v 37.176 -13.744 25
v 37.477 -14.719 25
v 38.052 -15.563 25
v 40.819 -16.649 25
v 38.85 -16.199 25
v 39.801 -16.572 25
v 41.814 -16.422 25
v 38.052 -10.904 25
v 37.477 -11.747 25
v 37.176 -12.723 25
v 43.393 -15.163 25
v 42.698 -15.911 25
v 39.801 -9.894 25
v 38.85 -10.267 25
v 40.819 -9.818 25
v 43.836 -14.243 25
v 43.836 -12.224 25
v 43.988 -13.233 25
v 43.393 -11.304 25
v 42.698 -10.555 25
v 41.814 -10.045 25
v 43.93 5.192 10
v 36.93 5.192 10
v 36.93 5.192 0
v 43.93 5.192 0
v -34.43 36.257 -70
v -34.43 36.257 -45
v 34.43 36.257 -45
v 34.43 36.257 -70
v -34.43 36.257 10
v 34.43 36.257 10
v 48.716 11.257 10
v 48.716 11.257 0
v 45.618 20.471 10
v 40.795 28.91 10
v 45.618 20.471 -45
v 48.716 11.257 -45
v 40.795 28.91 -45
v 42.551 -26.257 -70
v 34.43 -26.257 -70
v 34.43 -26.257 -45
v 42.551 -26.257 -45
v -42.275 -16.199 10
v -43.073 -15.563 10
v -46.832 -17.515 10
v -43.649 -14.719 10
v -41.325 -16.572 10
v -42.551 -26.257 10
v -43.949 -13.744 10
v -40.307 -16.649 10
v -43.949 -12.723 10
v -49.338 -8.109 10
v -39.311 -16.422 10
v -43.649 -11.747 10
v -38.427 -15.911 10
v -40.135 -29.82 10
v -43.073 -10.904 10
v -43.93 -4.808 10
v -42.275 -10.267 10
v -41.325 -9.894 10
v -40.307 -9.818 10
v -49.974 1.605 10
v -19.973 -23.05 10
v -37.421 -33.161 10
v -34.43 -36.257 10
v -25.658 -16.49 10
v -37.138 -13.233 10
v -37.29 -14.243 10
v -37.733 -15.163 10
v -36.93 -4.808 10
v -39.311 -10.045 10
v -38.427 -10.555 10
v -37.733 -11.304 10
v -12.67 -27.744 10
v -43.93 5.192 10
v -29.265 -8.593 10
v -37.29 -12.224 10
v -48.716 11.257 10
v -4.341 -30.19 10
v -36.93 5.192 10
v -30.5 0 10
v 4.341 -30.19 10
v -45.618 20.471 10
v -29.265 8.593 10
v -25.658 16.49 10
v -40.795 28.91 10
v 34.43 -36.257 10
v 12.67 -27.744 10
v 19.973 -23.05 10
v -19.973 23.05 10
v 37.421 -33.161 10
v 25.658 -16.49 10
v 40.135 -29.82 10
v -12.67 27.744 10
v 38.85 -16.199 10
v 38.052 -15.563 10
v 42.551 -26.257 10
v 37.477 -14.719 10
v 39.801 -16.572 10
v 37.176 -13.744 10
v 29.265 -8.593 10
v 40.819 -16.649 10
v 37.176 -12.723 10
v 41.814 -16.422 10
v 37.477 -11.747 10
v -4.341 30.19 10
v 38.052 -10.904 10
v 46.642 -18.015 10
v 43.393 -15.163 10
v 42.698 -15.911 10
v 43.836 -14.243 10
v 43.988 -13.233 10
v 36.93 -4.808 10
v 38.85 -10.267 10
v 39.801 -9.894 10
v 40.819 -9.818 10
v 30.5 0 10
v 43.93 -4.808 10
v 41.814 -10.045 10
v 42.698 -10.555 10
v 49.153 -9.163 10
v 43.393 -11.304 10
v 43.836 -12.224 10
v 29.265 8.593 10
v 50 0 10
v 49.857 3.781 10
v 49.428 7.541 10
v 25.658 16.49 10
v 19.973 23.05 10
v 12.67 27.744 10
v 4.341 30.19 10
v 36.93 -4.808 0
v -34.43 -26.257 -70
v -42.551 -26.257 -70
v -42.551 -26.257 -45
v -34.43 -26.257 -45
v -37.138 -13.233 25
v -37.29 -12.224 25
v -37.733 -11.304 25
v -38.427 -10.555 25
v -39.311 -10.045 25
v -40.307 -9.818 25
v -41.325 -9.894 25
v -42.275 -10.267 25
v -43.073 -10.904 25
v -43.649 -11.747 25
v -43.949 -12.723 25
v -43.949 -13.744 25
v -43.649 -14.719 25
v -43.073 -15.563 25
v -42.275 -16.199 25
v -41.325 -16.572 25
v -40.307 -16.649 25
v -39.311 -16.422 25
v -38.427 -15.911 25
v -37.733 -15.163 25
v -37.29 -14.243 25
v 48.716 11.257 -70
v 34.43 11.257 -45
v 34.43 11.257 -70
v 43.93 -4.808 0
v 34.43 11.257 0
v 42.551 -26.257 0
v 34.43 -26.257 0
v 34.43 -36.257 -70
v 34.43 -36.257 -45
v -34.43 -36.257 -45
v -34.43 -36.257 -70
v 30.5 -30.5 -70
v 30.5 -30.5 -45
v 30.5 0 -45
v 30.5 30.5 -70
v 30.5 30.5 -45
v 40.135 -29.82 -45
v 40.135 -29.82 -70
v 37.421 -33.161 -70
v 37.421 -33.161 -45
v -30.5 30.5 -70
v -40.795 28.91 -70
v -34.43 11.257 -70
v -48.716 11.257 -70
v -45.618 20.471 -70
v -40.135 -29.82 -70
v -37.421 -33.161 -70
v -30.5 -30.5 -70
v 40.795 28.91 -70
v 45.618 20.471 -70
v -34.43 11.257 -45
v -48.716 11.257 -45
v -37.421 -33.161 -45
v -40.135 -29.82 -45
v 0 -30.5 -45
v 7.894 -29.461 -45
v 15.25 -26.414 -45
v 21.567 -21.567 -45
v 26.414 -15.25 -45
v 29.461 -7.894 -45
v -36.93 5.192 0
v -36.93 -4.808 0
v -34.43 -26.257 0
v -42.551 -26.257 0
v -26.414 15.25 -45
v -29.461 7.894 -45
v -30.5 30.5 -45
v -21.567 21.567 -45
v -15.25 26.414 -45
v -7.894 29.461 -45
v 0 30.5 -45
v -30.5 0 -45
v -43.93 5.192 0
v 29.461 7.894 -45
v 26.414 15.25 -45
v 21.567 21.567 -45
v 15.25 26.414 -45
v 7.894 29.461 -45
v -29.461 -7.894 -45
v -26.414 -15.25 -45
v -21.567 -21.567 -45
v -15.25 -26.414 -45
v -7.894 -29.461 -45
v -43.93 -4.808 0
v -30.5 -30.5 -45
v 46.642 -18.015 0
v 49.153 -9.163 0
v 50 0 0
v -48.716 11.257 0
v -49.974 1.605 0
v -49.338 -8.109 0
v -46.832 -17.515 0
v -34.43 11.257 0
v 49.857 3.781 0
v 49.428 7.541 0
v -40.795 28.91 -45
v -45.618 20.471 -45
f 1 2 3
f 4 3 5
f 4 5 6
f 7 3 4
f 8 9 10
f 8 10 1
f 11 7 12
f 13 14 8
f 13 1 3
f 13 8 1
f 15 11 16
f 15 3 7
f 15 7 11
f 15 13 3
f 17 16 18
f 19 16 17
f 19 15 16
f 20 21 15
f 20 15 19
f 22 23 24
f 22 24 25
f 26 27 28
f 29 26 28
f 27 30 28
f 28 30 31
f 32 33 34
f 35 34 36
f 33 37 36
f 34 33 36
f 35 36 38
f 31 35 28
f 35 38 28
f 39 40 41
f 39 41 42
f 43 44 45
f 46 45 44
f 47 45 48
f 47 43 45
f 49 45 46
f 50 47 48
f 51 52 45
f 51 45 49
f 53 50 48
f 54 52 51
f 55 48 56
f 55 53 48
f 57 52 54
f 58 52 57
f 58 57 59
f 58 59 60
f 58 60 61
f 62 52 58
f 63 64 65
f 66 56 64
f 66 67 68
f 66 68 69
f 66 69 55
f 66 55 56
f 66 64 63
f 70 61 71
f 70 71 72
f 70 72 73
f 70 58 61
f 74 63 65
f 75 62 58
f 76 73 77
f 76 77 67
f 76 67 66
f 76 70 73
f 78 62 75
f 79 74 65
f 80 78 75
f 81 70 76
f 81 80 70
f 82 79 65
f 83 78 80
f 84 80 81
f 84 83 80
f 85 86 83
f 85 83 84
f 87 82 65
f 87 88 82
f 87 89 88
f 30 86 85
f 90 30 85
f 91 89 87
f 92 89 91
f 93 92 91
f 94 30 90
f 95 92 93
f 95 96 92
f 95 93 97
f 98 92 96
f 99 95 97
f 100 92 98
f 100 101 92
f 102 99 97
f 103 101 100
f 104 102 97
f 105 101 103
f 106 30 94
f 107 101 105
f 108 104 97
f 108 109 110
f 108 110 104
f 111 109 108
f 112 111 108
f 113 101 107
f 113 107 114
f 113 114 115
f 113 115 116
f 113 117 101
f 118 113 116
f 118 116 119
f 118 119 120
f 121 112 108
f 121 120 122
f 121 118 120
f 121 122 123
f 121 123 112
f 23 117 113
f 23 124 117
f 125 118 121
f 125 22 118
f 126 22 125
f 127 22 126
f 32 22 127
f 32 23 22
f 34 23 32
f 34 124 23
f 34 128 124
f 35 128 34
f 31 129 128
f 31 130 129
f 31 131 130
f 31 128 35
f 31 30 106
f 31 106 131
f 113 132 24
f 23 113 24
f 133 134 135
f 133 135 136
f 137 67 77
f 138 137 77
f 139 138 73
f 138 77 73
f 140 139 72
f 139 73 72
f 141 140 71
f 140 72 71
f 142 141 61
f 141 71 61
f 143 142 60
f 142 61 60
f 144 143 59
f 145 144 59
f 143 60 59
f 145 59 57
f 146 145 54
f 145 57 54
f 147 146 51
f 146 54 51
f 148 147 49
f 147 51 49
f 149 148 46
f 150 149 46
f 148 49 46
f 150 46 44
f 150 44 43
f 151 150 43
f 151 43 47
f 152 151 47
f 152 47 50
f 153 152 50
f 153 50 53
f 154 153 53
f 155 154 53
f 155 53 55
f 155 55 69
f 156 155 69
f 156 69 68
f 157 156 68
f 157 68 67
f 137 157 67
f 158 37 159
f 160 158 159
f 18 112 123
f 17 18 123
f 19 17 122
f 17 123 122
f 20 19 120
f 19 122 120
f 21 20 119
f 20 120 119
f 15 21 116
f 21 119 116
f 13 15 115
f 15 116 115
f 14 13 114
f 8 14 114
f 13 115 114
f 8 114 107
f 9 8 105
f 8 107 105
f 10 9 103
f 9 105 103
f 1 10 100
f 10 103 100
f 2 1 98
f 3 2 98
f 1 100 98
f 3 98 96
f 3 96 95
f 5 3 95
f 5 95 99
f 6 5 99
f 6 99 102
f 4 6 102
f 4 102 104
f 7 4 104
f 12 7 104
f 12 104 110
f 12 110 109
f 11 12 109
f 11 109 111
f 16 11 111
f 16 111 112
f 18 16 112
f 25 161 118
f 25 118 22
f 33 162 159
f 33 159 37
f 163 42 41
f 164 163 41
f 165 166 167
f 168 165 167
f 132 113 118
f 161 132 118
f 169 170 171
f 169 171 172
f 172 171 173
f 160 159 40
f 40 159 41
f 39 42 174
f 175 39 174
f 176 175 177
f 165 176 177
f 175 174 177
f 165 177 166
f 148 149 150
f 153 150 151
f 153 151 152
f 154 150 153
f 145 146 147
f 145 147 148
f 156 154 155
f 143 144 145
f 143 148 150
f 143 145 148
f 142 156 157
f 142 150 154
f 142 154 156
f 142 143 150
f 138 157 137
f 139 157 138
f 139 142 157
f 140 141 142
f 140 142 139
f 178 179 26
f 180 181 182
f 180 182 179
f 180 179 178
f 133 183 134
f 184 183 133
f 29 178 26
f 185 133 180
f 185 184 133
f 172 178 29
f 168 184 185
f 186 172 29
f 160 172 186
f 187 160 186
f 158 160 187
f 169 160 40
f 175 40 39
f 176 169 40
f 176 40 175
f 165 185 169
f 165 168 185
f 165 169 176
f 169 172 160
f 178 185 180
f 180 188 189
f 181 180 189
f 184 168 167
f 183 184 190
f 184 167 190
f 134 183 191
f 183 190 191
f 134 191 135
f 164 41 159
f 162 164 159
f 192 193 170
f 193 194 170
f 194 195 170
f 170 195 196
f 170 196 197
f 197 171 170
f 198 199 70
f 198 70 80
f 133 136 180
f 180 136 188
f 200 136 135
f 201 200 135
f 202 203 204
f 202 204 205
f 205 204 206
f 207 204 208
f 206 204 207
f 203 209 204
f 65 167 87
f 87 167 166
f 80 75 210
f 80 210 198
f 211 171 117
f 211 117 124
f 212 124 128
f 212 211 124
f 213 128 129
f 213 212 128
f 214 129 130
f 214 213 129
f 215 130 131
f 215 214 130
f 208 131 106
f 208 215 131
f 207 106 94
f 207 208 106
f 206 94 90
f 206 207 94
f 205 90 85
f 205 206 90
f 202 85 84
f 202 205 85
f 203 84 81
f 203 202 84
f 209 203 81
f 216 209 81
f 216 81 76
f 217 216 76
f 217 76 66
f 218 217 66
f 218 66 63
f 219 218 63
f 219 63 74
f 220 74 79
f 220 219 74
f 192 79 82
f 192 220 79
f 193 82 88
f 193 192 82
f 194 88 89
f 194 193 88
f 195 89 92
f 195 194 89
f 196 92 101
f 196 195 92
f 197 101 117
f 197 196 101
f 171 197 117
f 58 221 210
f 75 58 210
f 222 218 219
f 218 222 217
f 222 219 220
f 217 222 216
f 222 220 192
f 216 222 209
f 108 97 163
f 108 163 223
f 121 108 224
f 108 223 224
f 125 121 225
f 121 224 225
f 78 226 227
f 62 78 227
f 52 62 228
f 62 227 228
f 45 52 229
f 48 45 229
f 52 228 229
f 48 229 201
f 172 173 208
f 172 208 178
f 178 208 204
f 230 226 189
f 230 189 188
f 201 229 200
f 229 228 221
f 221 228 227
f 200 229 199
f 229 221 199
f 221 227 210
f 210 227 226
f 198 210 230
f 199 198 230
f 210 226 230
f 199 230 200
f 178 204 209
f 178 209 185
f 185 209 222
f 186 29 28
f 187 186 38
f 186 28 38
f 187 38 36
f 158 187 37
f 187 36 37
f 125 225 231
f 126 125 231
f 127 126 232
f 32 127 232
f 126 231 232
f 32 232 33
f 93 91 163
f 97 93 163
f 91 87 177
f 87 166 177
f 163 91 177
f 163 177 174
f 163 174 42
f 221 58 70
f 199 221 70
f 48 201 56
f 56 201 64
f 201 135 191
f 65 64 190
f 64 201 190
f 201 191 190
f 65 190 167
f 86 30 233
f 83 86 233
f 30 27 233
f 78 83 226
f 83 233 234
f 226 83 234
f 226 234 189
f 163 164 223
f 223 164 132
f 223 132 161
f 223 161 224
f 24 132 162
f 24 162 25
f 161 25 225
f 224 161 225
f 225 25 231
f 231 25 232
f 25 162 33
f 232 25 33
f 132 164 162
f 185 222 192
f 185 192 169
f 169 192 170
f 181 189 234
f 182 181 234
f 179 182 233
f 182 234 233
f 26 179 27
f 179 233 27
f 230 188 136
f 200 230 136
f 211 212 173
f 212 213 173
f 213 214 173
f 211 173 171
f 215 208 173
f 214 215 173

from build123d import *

# Parameters (mm, degrees)
F0_R     = 30.5
F1_DEPTH = 45
F0_R_2   = 3.425
F0_W     = 7
F0_H     = 10
F2_DEPTH = 10
F3_DEPTH = 25
F5_DEPTH = 25


# Not quite as in the source:
# - a feature names something its author has since deleted; it is built from what else it names


with BuildPart() as f1:
    # F0 (on Top) → F1 (new body)
    with BuildSketch(Plane.XY):
        Polygon((34.4299112098, 11.2571539711), (34.4299112098, 36.2571539711), (-34.4299112098, 36.2571539711), (-34.4299112098, 11.2571539711), (-34.4299112098, -26.2571539711), (-34.4299112098, -36.2571539711), (34.4299112098, -36.2571539711), (34.4299112098, -26.2571539711), align=None)
        Circle(F0_R, mode=Mode.SUBTRACT)
        with BuildLine():
            Line((-34.4299112098, 11.2571539711), (-34.4299112098, 36.2571539711))
            ThreePointArc((-34.4299112098, 36.2571539711), (-43.4116633148, 24.8078110329), (-48.7162856186, 11.2571539711))
            Line((-48.7162856186, 11.2571539711), (-34.4299112098, 11.2571539711))
        make_face()
        with BuildLine():
            Line((34.4299112098, 11.2571539711), (48.7162856186, 11.2571539711))
            ThreePointArc((48.7162856186, 11.2571539711), (43.4116633148, 24.8078110329), (34.4299112098, 36.2571539711))
            Line((34.4299112098, 36.2571539711), (34.4299112098, 11.2571539711))
        make_face()
        with BuildLine():
            ThreePointArc((34.4299112098, -36.2571539711), (38.8137028995, -31.5197789844), (42.5506975893, -26.2571539711))
            Line((42.5506975893, -26.2571539711), (34.4299112098, -26.2571539711))
            Line((34.4299112098, -26.2571539711), (34.4299112098, -36.2571539711))
        make_face()
        with BuildLine():
            ThreePointArc((-42.5506975893, -26.2571539711), (-38.8137028995, -31.5197789844), (-34.4299112098, -36.2571539711))
            Line((-34.4299112098, -36.2571539711), (-34.4299112098, -26.2571539711))
            Line((-34.4299112098, -26.2571539711), (-42.5506975893, -26.2571539711))
        make_face()
    extrude(amount=-F1_DEPTH)

    # F0 (on Top) → F2 (join)
    with BuildSketch(Plane.XY):
        Polygon((34.4299112098, 11.2571539711), (34.4299112098, 36.2571539711), (-34.4299112098, 36.2571539711), (-34.4299112098, 11.2571539711), (-34.4299112098, -26.2571539711), (-34.4299112098, -36.2571539711), (34.4299112098, -36.2571539711), (34.4299112098, -26.2571539711), align=None)
        Circle(F0_R, mode=Mode.SUBTRACT)
        with BuildLine():
            Line((-34.4299112098, 11.2571539711), (-48.7162856186, 11.2571539711))
            ThreePointArc((-48.7162856186, 11.2571539711), (-49.3380824624, -8.1088605202), (-42.5506975893, -26.2571539711))
            Line((-42.5506975893, -26.2571539711), (-34.4299112098, -26.2571539711))
            Line((-34.4299112098, -26.2571539711), (-34.4299112098, 11.2571539711))
        make_face()
        with Locations((-40.5626991825, -13.233267504)):
            Circle(F0_R_2, mode=Mode.SUBTRACT)
        with Locations((-40.4299112098, 0.191732496)):
            Rectangle(F0_W, F0_H, mode=Mode.SUBTRACT)
        with BuildLine():
            ThreePointArc((42.5506975893, -26.2571539711), (48.1016365598, -13.6467051066), (50, 0))
            ThreePointArc((50, 0), (49.6780347887, 5.6650560046), (48.7162856186, 11.2571539711))
            Line((48.7162856186, 11.2571539711), (34.4299112098, 11.2571539711))
            Line((34.4299112098, 11.2571539711), (34.4299112098, -26.2571539711))
            Line((34.4299112098, -26.2571539711), (42.5506975893, -26.2571539711))
        make_face()
        with Locations((40.5626991825, -13.233267504)):
            Circle(F0_R_2, mode=Mode.SUBTRACT)
        with Locations((40.4299112098, 0.191732496)):
            Rectangle(F0_W, F0_H, mode=Mode.SUBTRACT)
        with BuildLine():
            Line((34.4299112098, 11.2571539711), (48.7162856186, 11.2571539711))
            ThreePointArc((48.7162856186, 11.2571539711), (43.4116633148, 24.8078110329), (34.4299112098, 36.2571539711))
            Line((34.4299112098, 36.2571539711), (34.4299112098, 11.2571539711))
        make_face()
        with BuildLine():
            Line((-34.4299112098, 11.2571539711), (-34.4299112098, 36.2571539711))
            ThreePointArc((-34.4299112098, 36.2571539711), (-43.4116633148, 24.8078110329), (-48.7162856186, 11.2571539711))
            Line((-48.7162856186, 11.2571539711), (-34.4299112098, 11.2571539711))
        make_face()
        with BuildLine():
            ThreePointArc((34.4299112098, -36.2571539711), (38.8137028995, -31.5197789844), (42.5506975893, -26.2571539711))
            Line((42.5506975893, -26.2571539711), (34.4299112098, -26.2571539711))
            Line((34.4299112098, -26.2571539711), (34.4299112098, -36.2571539711))
        make_face()
        with BuildLine():
            ThreePointArc((-42.5506975893, -26.2571539711), (-38.8137028995, -31.5197789844), (-34.4299112098, -36.2571539711))
            Line((-34.4299112098, -36.2571539711), (-34.4299112098, -26.2571539711))
            Line((-34.4299112098, -26.2571539711), (-42.5506975893, -26.2571539711))
        make_face()
        with Locations((-40.5626991825, -13.233267504)):
            Circle(F0_R_2)
        with Locations((40.5626991825, -13.233267504)):
            Circle(F0_R_2)
    extrude(amount=F2_DEPTH)

    # F0 (on Top) → F3 (join)
    with BuildSketch(Plane.XY):
        with Locations((-40.5626991825, -13.233267504)):
            Circle(F0_R_2)
        with Locations((40.5626991825, -13.233267504)):
            Circle(F0_R_2)
    extrude(amount=F3_DEPTH)

    # F4 (on face) → F5 (join)
    with BuildSketch(Plane(origin=(0, 0, -45), x_dir=(1, 0, 0), z_dir=(0, 0, -1))):
        Polygon((-34.4299112098, -36.2571539711), (34.4299112098, -36.2571539711), (34.4299112098, -11.2571539711), (34.4299112098, 26.2571539711), (34.4299112098, 36.2571539711), (-34.4299112098, 36.2571539711), (-34.4299112098, 26.2571539711), (-34.4299112098, -11.2571539711), align=None)
        Polygon((0, 30.5), (30.5, 30.5), (30.5, 0), (30.5, -30.5), (-3.98e-08, -30.5), (-30.5, -30.5), (-30.5, 4.66e-08), (-30.5, 30.5), align=None, mode=Mode.SUBTRACT)
        with BuildLine():
            Line((34.4299112098, -11.2571539711), (34.4299112098, -36.2571539711))
            ThreePointArc((34.4299112098, -36.2571539711), (43.4116633148, -24.8078110329), (48.7162856186, -11.2571539711))
            Line((48.7162856186, -11.2571539711), (34.4299112098, -11.2571539711))
        make_face()
        with BuildLine():
            ThreePointArc((-48.7162856186, -11.2571539711), (-43.4116633148, -24.8078110329), (-34.4299112098, -36.2571539711))
            Line((-34.4299112098, -36.2571539711), (-34.4299112098, -11.2571539711))
            Line((-34.4299112098, -11.2571539711), (-48.7162856186, -11.2571539711))
        make_face()
        with BuildLine():
            Line((-42.5506975893, 26.2571539711), (-34.4299112098, 26.2571539711))
            Line((-34.4299112098, 26.2571539711), (-34.4299112098, 36.2571539711))
            ThreePointArc((-34.4299112098, 36.2571539711), (-38.8137028995, 31.5197789844), (-42.5506975893, 26.2571539711))
        make_face()
        with BuildLine():
            Line((34.4299112098, 36.2571539711), (34.4299112098, 26.2571539711))
            Line((34.4299112098, 26.2571539711), (42.5506975893, 26.2571539711))
            ThreePointArc((42.5506975893, 26.2571539711), (38.8137028995, 31.5197789844), (34.4299112098, 36.2571539711))
        make_face()
    extrude(amount=F5_DEPTH)


solid = f1.part
